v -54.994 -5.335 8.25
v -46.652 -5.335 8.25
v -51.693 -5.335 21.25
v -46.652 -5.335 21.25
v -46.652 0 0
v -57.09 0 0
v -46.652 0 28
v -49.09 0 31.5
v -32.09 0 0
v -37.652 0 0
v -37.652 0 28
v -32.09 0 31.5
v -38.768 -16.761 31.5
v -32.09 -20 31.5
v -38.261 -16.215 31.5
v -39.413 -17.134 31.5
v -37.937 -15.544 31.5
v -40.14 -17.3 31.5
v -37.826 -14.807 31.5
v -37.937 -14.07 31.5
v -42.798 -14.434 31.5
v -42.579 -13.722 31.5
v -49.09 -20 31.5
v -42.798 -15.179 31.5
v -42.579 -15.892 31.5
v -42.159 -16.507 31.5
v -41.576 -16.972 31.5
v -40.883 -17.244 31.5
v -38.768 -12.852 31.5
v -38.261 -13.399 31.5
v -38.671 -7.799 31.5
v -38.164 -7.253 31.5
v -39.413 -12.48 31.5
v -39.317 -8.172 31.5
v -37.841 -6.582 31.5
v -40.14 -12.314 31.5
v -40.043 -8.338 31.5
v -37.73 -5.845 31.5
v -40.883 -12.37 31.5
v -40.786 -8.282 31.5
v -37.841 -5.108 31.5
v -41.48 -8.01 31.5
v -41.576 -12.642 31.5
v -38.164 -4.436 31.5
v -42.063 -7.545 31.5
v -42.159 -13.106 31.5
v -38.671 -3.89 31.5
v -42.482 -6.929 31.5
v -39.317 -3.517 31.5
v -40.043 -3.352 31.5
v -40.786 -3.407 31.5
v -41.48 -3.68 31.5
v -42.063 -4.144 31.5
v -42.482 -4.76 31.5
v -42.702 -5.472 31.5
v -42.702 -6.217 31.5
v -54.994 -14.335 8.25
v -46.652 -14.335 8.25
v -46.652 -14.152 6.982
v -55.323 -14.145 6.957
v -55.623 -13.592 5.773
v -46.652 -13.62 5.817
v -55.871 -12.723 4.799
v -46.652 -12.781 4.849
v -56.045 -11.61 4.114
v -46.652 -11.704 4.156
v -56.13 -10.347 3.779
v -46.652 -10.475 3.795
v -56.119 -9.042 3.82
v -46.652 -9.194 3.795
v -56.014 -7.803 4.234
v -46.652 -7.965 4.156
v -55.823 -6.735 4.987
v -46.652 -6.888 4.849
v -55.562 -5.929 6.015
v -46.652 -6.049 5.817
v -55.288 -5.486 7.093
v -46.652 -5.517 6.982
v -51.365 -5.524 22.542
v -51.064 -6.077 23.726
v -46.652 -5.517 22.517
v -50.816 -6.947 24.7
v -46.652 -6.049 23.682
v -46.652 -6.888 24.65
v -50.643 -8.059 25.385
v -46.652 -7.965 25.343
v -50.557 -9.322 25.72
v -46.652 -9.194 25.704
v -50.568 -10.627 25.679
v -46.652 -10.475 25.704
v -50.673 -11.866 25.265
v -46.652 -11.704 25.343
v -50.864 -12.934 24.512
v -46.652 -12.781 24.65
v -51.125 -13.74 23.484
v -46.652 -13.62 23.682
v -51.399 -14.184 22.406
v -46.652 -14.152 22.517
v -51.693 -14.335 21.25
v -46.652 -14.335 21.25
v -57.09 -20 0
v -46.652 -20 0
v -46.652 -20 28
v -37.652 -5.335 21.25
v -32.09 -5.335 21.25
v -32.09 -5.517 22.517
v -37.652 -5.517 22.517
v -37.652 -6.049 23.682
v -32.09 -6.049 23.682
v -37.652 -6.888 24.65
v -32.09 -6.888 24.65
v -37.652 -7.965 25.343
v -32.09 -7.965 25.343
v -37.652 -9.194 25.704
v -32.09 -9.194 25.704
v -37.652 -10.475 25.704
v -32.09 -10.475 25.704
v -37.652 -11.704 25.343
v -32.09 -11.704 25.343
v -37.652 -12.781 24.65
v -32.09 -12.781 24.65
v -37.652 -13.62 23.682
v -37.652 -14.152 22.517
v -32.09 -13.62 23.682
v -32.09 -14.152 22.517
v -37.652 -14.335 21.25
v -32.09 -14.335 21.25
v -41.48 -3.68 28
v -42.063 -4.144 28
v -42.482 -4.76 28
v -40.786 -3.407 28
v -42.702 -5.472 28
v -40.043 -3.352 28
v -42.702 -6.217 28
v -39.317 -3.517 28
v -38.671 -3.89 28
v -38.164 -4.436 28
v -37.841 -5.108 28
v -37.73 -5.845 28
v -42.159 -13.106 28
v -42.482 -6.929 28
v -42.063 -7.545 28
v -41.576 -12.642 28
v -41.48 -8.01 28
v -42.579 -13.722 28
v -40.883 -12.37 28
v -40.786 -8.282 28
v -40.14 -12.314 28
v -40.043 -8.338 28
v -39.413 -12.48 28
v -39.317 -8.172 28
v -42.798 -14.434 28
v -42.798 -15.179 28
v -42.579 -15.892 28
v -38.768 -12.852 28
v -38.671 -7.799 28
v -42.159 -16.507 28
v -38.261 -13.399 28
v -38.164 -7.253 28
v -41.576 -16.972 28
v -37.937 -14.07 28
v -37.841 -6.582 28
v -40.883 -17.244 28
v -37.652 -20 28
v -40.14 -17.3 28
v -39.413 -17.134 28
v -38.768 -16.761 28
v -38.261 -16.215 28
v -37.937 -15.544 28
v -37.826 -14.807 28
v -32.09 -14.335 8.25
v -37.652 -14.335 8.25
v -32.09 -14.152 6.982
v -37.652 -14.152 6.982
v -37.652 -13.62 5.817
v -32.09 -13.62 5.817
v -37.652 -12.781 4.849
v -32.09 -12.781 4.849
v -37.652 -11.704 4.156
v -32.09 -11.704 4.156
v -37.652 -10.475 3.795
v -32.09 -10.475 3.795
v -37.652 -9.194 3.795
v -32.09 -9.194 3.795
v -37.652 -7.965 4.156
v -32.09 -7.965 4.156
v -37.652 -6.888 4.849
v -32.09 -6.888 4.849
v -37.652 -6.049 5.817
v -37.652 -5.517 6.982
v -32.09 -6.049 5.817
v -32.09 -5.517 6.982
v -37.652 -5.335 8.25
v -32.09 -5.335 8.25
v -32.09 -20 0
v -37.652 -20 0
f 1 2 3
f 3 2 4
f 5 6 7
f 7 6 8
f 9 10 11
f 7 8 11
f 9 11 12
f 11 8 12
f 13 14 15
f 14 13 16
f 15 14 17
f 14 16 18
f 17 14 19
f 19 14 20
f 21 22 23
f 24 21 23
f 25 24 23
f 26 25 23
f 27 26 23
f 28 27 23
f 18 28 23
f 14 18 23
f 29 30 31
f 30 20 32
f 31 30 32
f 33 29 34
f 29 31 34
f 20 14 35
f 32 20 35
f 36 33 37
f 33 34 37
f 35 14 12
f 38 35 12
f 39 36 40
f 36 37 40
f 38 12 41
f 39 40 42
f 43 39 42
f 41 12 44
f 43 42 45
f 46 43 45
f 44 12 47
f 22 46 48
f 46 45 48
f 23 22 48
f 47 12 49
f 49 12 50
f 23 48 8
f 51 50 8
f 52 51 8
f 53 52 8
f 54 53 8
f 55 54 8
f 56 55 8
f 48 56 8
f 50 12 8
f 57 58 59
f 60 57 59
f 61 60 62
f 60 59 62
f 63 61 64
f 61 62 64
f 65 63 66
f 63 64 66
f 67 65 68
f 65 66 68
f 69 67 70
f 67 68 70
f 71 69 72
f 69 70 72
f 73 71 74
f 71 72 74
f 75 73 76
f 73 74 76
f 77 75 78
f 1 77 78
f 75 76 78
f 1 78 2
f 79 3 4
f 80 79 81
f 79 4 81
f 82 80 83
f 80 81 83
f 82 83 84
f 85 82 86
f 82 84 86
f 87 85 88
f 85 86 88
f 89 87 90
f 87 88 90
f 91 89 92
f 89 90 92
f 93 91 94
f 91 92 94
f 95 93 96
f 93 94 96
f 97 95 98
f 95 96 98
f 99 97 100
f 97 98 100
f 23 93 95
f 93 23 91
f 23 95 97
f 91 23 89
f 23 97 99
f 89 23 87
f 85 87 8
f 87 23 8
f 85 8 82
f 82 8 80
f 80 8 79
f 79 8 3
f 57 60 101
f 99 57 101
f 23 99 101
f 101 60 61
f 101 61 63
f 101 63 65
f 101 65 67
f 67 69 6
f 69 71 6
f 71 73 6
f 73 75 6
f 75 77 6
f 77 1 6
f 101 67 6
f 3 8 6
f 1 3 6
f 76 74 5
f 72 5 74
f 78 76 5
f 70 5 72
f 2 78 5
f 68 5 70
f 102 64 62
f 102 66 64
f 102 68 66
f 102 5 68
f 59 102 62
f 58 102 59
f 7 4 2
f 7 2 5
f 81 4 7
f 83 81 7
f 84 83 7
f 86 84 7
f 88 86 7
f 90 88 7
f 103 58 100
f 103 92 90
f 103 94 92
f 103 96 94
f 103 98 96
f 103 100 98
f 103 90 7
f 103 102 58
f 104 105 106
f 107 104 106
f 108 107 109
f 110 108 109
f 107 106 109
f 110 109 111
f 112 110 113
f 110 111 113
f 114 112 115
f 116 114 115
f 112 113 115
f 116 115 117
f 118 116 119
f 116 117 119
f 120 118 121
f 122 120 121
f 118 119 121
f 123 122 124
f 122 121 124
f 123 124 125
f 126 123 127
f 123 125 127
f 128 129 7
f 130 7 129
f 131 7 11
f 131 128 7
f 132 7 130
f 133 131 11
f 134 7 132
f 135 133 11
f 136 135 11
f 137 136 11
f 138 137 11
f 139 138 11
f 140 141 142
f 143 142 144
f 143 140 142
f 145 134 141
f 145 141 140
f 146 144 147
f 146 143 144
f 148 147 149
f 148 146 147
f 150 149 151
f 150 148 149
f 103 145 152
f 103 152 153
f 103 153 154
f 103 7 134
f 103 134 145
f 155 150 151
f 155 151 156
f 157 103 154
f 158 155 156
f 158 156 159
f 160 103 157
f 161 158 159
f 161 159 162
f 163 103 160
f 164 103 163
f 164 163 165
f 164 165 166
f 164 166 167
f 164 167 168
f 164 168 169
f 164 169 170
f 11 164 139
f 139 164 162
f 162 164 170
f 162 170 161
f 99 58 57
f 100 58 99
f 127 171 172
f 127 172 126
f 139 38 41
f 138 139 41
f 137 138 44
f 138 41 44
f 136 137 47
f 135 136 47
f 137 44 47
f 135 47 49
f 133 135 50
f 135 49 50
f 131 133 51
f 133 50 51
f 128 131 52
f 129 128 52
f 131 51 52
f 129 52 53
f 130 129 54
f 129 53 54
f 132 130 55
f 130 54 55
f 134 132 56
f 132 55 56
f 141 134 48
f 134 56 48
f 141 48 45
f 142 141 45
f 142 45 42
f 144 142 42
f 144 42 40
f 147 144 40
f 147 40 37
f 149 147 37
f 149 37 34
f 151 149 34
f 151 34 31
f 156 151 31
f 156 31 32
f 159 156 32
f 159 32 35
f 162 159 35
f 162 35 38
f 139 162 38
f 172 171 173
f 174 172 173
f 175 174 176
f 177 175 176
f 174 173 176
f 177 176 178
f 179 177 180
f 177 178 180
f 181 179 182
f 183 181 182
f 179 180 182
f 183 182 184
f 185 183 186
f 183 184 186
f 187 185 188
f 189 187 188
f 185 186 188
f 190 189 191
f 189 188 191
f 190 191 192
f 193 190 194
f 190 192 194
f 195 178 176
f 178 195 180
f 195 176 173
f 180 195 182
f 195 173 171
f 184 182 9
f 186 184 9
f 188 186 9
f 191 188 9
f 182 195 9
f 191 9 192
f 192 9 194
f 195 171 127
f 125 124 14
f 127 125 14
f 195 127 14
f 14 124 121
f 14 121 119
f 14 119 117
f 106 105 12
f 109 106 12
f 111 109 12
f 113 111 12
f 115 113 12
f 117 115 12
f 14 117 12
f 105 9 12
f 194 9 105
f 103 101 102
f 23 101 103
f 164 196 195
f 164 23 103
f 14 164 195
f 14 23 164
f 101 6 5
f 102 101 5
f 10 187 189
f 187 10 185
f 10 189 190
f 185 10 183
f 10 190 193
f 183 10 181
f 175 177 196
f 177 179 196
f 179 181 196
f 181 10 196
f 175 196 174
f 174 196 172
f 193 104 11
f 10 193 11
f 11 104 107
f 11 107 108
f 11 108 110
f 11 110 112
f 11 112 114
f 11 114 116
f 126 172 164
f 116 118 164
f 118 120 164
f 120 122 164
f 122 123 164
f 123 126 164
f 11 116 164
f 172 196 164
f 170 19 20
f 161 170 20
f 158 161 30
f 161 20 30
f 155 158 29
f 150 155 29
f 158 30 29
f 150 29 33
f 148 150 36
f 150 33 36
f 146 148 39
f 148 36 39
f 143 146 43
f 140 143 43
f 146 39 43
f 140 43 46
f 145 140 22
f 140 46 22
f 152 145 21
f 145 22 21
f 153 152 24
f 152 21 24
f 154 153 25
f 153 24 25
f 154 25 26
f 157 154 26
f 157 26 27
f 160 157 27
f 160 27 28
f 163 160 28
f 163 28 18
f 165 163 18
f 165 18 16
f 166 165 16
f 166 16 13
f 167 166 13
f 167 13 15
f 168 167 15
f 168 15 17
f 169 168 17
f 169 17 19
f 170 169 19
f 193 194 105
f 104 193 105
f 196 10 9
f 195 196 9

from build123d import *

# Parameters (mm, degrees)
F1_DEPTH = 20
F2_R     = 2.5
F3_DEPTH = 10
F5_W     = 9
F5_H     = 28
F6_DEPTH = 25
F7_W     = 9
F7_H     = 13
F8_DEPTH = 25


with BuildPart() as f1:
    # F0 (on Front) → F1 (new body)
    with BuildSketch(Plane.XZ):
        Polygon((-49.089543, 31.5), (-57.089543, 0), (-32.089543, 0), (-32.089543, 31.5), align=None)
    extrude(amount=F1_DEPTH)

    # F2 (on face) → F3 (cut)
    with BuildSketch(Plane.XY.offset(31.5)):
        with Locations((-40.230012, -5.844655)):
            Circle(F2_R)
        with Locations((-40.32638, -14.806874)):
            Circle(F2_R)
    extrude(amount=-F3_DEPTH, mode=Mode.SUBTRACT)

    # F5 (on face) → F6 (cut)
    with BuildSketch(Plane.XZ.offset(20)):
        with Locations((-42.152388, 14)):
            Rectangle(F5_W, F5_H)
    extrude(amount=-F6_DEPTH, mode=Mode.SUBTRACT)

    # F7 (on face) → F8 (cut)
    with BuildSketch(Plane.YZ.offset(-32.089543)):
        with BuildLine():
            ThreePointArc((-5.334587, 21.249529), (-9.834587, 25.749529), (-14.334587, 21.249529))
            Line((-14.334587, 21.249529), (-5.334587, 21.249529))
        make_face()
        with Locations((-9.834587, 14.749529)):
            Rectangle(F7_W, F7_H)
        with BuildLine():
            Line((-5.334587, 8.249529), (-14.334587, 8.249529))
            ThreePointArc((-14.334587, 8.249529), (-9.834587, 3.749529), (-5.334587, 8.249529))
        make_face()
    extrude(amount=-F8_DEPTH, mode=Mode.SUBTRACT)


solid = f1.part
